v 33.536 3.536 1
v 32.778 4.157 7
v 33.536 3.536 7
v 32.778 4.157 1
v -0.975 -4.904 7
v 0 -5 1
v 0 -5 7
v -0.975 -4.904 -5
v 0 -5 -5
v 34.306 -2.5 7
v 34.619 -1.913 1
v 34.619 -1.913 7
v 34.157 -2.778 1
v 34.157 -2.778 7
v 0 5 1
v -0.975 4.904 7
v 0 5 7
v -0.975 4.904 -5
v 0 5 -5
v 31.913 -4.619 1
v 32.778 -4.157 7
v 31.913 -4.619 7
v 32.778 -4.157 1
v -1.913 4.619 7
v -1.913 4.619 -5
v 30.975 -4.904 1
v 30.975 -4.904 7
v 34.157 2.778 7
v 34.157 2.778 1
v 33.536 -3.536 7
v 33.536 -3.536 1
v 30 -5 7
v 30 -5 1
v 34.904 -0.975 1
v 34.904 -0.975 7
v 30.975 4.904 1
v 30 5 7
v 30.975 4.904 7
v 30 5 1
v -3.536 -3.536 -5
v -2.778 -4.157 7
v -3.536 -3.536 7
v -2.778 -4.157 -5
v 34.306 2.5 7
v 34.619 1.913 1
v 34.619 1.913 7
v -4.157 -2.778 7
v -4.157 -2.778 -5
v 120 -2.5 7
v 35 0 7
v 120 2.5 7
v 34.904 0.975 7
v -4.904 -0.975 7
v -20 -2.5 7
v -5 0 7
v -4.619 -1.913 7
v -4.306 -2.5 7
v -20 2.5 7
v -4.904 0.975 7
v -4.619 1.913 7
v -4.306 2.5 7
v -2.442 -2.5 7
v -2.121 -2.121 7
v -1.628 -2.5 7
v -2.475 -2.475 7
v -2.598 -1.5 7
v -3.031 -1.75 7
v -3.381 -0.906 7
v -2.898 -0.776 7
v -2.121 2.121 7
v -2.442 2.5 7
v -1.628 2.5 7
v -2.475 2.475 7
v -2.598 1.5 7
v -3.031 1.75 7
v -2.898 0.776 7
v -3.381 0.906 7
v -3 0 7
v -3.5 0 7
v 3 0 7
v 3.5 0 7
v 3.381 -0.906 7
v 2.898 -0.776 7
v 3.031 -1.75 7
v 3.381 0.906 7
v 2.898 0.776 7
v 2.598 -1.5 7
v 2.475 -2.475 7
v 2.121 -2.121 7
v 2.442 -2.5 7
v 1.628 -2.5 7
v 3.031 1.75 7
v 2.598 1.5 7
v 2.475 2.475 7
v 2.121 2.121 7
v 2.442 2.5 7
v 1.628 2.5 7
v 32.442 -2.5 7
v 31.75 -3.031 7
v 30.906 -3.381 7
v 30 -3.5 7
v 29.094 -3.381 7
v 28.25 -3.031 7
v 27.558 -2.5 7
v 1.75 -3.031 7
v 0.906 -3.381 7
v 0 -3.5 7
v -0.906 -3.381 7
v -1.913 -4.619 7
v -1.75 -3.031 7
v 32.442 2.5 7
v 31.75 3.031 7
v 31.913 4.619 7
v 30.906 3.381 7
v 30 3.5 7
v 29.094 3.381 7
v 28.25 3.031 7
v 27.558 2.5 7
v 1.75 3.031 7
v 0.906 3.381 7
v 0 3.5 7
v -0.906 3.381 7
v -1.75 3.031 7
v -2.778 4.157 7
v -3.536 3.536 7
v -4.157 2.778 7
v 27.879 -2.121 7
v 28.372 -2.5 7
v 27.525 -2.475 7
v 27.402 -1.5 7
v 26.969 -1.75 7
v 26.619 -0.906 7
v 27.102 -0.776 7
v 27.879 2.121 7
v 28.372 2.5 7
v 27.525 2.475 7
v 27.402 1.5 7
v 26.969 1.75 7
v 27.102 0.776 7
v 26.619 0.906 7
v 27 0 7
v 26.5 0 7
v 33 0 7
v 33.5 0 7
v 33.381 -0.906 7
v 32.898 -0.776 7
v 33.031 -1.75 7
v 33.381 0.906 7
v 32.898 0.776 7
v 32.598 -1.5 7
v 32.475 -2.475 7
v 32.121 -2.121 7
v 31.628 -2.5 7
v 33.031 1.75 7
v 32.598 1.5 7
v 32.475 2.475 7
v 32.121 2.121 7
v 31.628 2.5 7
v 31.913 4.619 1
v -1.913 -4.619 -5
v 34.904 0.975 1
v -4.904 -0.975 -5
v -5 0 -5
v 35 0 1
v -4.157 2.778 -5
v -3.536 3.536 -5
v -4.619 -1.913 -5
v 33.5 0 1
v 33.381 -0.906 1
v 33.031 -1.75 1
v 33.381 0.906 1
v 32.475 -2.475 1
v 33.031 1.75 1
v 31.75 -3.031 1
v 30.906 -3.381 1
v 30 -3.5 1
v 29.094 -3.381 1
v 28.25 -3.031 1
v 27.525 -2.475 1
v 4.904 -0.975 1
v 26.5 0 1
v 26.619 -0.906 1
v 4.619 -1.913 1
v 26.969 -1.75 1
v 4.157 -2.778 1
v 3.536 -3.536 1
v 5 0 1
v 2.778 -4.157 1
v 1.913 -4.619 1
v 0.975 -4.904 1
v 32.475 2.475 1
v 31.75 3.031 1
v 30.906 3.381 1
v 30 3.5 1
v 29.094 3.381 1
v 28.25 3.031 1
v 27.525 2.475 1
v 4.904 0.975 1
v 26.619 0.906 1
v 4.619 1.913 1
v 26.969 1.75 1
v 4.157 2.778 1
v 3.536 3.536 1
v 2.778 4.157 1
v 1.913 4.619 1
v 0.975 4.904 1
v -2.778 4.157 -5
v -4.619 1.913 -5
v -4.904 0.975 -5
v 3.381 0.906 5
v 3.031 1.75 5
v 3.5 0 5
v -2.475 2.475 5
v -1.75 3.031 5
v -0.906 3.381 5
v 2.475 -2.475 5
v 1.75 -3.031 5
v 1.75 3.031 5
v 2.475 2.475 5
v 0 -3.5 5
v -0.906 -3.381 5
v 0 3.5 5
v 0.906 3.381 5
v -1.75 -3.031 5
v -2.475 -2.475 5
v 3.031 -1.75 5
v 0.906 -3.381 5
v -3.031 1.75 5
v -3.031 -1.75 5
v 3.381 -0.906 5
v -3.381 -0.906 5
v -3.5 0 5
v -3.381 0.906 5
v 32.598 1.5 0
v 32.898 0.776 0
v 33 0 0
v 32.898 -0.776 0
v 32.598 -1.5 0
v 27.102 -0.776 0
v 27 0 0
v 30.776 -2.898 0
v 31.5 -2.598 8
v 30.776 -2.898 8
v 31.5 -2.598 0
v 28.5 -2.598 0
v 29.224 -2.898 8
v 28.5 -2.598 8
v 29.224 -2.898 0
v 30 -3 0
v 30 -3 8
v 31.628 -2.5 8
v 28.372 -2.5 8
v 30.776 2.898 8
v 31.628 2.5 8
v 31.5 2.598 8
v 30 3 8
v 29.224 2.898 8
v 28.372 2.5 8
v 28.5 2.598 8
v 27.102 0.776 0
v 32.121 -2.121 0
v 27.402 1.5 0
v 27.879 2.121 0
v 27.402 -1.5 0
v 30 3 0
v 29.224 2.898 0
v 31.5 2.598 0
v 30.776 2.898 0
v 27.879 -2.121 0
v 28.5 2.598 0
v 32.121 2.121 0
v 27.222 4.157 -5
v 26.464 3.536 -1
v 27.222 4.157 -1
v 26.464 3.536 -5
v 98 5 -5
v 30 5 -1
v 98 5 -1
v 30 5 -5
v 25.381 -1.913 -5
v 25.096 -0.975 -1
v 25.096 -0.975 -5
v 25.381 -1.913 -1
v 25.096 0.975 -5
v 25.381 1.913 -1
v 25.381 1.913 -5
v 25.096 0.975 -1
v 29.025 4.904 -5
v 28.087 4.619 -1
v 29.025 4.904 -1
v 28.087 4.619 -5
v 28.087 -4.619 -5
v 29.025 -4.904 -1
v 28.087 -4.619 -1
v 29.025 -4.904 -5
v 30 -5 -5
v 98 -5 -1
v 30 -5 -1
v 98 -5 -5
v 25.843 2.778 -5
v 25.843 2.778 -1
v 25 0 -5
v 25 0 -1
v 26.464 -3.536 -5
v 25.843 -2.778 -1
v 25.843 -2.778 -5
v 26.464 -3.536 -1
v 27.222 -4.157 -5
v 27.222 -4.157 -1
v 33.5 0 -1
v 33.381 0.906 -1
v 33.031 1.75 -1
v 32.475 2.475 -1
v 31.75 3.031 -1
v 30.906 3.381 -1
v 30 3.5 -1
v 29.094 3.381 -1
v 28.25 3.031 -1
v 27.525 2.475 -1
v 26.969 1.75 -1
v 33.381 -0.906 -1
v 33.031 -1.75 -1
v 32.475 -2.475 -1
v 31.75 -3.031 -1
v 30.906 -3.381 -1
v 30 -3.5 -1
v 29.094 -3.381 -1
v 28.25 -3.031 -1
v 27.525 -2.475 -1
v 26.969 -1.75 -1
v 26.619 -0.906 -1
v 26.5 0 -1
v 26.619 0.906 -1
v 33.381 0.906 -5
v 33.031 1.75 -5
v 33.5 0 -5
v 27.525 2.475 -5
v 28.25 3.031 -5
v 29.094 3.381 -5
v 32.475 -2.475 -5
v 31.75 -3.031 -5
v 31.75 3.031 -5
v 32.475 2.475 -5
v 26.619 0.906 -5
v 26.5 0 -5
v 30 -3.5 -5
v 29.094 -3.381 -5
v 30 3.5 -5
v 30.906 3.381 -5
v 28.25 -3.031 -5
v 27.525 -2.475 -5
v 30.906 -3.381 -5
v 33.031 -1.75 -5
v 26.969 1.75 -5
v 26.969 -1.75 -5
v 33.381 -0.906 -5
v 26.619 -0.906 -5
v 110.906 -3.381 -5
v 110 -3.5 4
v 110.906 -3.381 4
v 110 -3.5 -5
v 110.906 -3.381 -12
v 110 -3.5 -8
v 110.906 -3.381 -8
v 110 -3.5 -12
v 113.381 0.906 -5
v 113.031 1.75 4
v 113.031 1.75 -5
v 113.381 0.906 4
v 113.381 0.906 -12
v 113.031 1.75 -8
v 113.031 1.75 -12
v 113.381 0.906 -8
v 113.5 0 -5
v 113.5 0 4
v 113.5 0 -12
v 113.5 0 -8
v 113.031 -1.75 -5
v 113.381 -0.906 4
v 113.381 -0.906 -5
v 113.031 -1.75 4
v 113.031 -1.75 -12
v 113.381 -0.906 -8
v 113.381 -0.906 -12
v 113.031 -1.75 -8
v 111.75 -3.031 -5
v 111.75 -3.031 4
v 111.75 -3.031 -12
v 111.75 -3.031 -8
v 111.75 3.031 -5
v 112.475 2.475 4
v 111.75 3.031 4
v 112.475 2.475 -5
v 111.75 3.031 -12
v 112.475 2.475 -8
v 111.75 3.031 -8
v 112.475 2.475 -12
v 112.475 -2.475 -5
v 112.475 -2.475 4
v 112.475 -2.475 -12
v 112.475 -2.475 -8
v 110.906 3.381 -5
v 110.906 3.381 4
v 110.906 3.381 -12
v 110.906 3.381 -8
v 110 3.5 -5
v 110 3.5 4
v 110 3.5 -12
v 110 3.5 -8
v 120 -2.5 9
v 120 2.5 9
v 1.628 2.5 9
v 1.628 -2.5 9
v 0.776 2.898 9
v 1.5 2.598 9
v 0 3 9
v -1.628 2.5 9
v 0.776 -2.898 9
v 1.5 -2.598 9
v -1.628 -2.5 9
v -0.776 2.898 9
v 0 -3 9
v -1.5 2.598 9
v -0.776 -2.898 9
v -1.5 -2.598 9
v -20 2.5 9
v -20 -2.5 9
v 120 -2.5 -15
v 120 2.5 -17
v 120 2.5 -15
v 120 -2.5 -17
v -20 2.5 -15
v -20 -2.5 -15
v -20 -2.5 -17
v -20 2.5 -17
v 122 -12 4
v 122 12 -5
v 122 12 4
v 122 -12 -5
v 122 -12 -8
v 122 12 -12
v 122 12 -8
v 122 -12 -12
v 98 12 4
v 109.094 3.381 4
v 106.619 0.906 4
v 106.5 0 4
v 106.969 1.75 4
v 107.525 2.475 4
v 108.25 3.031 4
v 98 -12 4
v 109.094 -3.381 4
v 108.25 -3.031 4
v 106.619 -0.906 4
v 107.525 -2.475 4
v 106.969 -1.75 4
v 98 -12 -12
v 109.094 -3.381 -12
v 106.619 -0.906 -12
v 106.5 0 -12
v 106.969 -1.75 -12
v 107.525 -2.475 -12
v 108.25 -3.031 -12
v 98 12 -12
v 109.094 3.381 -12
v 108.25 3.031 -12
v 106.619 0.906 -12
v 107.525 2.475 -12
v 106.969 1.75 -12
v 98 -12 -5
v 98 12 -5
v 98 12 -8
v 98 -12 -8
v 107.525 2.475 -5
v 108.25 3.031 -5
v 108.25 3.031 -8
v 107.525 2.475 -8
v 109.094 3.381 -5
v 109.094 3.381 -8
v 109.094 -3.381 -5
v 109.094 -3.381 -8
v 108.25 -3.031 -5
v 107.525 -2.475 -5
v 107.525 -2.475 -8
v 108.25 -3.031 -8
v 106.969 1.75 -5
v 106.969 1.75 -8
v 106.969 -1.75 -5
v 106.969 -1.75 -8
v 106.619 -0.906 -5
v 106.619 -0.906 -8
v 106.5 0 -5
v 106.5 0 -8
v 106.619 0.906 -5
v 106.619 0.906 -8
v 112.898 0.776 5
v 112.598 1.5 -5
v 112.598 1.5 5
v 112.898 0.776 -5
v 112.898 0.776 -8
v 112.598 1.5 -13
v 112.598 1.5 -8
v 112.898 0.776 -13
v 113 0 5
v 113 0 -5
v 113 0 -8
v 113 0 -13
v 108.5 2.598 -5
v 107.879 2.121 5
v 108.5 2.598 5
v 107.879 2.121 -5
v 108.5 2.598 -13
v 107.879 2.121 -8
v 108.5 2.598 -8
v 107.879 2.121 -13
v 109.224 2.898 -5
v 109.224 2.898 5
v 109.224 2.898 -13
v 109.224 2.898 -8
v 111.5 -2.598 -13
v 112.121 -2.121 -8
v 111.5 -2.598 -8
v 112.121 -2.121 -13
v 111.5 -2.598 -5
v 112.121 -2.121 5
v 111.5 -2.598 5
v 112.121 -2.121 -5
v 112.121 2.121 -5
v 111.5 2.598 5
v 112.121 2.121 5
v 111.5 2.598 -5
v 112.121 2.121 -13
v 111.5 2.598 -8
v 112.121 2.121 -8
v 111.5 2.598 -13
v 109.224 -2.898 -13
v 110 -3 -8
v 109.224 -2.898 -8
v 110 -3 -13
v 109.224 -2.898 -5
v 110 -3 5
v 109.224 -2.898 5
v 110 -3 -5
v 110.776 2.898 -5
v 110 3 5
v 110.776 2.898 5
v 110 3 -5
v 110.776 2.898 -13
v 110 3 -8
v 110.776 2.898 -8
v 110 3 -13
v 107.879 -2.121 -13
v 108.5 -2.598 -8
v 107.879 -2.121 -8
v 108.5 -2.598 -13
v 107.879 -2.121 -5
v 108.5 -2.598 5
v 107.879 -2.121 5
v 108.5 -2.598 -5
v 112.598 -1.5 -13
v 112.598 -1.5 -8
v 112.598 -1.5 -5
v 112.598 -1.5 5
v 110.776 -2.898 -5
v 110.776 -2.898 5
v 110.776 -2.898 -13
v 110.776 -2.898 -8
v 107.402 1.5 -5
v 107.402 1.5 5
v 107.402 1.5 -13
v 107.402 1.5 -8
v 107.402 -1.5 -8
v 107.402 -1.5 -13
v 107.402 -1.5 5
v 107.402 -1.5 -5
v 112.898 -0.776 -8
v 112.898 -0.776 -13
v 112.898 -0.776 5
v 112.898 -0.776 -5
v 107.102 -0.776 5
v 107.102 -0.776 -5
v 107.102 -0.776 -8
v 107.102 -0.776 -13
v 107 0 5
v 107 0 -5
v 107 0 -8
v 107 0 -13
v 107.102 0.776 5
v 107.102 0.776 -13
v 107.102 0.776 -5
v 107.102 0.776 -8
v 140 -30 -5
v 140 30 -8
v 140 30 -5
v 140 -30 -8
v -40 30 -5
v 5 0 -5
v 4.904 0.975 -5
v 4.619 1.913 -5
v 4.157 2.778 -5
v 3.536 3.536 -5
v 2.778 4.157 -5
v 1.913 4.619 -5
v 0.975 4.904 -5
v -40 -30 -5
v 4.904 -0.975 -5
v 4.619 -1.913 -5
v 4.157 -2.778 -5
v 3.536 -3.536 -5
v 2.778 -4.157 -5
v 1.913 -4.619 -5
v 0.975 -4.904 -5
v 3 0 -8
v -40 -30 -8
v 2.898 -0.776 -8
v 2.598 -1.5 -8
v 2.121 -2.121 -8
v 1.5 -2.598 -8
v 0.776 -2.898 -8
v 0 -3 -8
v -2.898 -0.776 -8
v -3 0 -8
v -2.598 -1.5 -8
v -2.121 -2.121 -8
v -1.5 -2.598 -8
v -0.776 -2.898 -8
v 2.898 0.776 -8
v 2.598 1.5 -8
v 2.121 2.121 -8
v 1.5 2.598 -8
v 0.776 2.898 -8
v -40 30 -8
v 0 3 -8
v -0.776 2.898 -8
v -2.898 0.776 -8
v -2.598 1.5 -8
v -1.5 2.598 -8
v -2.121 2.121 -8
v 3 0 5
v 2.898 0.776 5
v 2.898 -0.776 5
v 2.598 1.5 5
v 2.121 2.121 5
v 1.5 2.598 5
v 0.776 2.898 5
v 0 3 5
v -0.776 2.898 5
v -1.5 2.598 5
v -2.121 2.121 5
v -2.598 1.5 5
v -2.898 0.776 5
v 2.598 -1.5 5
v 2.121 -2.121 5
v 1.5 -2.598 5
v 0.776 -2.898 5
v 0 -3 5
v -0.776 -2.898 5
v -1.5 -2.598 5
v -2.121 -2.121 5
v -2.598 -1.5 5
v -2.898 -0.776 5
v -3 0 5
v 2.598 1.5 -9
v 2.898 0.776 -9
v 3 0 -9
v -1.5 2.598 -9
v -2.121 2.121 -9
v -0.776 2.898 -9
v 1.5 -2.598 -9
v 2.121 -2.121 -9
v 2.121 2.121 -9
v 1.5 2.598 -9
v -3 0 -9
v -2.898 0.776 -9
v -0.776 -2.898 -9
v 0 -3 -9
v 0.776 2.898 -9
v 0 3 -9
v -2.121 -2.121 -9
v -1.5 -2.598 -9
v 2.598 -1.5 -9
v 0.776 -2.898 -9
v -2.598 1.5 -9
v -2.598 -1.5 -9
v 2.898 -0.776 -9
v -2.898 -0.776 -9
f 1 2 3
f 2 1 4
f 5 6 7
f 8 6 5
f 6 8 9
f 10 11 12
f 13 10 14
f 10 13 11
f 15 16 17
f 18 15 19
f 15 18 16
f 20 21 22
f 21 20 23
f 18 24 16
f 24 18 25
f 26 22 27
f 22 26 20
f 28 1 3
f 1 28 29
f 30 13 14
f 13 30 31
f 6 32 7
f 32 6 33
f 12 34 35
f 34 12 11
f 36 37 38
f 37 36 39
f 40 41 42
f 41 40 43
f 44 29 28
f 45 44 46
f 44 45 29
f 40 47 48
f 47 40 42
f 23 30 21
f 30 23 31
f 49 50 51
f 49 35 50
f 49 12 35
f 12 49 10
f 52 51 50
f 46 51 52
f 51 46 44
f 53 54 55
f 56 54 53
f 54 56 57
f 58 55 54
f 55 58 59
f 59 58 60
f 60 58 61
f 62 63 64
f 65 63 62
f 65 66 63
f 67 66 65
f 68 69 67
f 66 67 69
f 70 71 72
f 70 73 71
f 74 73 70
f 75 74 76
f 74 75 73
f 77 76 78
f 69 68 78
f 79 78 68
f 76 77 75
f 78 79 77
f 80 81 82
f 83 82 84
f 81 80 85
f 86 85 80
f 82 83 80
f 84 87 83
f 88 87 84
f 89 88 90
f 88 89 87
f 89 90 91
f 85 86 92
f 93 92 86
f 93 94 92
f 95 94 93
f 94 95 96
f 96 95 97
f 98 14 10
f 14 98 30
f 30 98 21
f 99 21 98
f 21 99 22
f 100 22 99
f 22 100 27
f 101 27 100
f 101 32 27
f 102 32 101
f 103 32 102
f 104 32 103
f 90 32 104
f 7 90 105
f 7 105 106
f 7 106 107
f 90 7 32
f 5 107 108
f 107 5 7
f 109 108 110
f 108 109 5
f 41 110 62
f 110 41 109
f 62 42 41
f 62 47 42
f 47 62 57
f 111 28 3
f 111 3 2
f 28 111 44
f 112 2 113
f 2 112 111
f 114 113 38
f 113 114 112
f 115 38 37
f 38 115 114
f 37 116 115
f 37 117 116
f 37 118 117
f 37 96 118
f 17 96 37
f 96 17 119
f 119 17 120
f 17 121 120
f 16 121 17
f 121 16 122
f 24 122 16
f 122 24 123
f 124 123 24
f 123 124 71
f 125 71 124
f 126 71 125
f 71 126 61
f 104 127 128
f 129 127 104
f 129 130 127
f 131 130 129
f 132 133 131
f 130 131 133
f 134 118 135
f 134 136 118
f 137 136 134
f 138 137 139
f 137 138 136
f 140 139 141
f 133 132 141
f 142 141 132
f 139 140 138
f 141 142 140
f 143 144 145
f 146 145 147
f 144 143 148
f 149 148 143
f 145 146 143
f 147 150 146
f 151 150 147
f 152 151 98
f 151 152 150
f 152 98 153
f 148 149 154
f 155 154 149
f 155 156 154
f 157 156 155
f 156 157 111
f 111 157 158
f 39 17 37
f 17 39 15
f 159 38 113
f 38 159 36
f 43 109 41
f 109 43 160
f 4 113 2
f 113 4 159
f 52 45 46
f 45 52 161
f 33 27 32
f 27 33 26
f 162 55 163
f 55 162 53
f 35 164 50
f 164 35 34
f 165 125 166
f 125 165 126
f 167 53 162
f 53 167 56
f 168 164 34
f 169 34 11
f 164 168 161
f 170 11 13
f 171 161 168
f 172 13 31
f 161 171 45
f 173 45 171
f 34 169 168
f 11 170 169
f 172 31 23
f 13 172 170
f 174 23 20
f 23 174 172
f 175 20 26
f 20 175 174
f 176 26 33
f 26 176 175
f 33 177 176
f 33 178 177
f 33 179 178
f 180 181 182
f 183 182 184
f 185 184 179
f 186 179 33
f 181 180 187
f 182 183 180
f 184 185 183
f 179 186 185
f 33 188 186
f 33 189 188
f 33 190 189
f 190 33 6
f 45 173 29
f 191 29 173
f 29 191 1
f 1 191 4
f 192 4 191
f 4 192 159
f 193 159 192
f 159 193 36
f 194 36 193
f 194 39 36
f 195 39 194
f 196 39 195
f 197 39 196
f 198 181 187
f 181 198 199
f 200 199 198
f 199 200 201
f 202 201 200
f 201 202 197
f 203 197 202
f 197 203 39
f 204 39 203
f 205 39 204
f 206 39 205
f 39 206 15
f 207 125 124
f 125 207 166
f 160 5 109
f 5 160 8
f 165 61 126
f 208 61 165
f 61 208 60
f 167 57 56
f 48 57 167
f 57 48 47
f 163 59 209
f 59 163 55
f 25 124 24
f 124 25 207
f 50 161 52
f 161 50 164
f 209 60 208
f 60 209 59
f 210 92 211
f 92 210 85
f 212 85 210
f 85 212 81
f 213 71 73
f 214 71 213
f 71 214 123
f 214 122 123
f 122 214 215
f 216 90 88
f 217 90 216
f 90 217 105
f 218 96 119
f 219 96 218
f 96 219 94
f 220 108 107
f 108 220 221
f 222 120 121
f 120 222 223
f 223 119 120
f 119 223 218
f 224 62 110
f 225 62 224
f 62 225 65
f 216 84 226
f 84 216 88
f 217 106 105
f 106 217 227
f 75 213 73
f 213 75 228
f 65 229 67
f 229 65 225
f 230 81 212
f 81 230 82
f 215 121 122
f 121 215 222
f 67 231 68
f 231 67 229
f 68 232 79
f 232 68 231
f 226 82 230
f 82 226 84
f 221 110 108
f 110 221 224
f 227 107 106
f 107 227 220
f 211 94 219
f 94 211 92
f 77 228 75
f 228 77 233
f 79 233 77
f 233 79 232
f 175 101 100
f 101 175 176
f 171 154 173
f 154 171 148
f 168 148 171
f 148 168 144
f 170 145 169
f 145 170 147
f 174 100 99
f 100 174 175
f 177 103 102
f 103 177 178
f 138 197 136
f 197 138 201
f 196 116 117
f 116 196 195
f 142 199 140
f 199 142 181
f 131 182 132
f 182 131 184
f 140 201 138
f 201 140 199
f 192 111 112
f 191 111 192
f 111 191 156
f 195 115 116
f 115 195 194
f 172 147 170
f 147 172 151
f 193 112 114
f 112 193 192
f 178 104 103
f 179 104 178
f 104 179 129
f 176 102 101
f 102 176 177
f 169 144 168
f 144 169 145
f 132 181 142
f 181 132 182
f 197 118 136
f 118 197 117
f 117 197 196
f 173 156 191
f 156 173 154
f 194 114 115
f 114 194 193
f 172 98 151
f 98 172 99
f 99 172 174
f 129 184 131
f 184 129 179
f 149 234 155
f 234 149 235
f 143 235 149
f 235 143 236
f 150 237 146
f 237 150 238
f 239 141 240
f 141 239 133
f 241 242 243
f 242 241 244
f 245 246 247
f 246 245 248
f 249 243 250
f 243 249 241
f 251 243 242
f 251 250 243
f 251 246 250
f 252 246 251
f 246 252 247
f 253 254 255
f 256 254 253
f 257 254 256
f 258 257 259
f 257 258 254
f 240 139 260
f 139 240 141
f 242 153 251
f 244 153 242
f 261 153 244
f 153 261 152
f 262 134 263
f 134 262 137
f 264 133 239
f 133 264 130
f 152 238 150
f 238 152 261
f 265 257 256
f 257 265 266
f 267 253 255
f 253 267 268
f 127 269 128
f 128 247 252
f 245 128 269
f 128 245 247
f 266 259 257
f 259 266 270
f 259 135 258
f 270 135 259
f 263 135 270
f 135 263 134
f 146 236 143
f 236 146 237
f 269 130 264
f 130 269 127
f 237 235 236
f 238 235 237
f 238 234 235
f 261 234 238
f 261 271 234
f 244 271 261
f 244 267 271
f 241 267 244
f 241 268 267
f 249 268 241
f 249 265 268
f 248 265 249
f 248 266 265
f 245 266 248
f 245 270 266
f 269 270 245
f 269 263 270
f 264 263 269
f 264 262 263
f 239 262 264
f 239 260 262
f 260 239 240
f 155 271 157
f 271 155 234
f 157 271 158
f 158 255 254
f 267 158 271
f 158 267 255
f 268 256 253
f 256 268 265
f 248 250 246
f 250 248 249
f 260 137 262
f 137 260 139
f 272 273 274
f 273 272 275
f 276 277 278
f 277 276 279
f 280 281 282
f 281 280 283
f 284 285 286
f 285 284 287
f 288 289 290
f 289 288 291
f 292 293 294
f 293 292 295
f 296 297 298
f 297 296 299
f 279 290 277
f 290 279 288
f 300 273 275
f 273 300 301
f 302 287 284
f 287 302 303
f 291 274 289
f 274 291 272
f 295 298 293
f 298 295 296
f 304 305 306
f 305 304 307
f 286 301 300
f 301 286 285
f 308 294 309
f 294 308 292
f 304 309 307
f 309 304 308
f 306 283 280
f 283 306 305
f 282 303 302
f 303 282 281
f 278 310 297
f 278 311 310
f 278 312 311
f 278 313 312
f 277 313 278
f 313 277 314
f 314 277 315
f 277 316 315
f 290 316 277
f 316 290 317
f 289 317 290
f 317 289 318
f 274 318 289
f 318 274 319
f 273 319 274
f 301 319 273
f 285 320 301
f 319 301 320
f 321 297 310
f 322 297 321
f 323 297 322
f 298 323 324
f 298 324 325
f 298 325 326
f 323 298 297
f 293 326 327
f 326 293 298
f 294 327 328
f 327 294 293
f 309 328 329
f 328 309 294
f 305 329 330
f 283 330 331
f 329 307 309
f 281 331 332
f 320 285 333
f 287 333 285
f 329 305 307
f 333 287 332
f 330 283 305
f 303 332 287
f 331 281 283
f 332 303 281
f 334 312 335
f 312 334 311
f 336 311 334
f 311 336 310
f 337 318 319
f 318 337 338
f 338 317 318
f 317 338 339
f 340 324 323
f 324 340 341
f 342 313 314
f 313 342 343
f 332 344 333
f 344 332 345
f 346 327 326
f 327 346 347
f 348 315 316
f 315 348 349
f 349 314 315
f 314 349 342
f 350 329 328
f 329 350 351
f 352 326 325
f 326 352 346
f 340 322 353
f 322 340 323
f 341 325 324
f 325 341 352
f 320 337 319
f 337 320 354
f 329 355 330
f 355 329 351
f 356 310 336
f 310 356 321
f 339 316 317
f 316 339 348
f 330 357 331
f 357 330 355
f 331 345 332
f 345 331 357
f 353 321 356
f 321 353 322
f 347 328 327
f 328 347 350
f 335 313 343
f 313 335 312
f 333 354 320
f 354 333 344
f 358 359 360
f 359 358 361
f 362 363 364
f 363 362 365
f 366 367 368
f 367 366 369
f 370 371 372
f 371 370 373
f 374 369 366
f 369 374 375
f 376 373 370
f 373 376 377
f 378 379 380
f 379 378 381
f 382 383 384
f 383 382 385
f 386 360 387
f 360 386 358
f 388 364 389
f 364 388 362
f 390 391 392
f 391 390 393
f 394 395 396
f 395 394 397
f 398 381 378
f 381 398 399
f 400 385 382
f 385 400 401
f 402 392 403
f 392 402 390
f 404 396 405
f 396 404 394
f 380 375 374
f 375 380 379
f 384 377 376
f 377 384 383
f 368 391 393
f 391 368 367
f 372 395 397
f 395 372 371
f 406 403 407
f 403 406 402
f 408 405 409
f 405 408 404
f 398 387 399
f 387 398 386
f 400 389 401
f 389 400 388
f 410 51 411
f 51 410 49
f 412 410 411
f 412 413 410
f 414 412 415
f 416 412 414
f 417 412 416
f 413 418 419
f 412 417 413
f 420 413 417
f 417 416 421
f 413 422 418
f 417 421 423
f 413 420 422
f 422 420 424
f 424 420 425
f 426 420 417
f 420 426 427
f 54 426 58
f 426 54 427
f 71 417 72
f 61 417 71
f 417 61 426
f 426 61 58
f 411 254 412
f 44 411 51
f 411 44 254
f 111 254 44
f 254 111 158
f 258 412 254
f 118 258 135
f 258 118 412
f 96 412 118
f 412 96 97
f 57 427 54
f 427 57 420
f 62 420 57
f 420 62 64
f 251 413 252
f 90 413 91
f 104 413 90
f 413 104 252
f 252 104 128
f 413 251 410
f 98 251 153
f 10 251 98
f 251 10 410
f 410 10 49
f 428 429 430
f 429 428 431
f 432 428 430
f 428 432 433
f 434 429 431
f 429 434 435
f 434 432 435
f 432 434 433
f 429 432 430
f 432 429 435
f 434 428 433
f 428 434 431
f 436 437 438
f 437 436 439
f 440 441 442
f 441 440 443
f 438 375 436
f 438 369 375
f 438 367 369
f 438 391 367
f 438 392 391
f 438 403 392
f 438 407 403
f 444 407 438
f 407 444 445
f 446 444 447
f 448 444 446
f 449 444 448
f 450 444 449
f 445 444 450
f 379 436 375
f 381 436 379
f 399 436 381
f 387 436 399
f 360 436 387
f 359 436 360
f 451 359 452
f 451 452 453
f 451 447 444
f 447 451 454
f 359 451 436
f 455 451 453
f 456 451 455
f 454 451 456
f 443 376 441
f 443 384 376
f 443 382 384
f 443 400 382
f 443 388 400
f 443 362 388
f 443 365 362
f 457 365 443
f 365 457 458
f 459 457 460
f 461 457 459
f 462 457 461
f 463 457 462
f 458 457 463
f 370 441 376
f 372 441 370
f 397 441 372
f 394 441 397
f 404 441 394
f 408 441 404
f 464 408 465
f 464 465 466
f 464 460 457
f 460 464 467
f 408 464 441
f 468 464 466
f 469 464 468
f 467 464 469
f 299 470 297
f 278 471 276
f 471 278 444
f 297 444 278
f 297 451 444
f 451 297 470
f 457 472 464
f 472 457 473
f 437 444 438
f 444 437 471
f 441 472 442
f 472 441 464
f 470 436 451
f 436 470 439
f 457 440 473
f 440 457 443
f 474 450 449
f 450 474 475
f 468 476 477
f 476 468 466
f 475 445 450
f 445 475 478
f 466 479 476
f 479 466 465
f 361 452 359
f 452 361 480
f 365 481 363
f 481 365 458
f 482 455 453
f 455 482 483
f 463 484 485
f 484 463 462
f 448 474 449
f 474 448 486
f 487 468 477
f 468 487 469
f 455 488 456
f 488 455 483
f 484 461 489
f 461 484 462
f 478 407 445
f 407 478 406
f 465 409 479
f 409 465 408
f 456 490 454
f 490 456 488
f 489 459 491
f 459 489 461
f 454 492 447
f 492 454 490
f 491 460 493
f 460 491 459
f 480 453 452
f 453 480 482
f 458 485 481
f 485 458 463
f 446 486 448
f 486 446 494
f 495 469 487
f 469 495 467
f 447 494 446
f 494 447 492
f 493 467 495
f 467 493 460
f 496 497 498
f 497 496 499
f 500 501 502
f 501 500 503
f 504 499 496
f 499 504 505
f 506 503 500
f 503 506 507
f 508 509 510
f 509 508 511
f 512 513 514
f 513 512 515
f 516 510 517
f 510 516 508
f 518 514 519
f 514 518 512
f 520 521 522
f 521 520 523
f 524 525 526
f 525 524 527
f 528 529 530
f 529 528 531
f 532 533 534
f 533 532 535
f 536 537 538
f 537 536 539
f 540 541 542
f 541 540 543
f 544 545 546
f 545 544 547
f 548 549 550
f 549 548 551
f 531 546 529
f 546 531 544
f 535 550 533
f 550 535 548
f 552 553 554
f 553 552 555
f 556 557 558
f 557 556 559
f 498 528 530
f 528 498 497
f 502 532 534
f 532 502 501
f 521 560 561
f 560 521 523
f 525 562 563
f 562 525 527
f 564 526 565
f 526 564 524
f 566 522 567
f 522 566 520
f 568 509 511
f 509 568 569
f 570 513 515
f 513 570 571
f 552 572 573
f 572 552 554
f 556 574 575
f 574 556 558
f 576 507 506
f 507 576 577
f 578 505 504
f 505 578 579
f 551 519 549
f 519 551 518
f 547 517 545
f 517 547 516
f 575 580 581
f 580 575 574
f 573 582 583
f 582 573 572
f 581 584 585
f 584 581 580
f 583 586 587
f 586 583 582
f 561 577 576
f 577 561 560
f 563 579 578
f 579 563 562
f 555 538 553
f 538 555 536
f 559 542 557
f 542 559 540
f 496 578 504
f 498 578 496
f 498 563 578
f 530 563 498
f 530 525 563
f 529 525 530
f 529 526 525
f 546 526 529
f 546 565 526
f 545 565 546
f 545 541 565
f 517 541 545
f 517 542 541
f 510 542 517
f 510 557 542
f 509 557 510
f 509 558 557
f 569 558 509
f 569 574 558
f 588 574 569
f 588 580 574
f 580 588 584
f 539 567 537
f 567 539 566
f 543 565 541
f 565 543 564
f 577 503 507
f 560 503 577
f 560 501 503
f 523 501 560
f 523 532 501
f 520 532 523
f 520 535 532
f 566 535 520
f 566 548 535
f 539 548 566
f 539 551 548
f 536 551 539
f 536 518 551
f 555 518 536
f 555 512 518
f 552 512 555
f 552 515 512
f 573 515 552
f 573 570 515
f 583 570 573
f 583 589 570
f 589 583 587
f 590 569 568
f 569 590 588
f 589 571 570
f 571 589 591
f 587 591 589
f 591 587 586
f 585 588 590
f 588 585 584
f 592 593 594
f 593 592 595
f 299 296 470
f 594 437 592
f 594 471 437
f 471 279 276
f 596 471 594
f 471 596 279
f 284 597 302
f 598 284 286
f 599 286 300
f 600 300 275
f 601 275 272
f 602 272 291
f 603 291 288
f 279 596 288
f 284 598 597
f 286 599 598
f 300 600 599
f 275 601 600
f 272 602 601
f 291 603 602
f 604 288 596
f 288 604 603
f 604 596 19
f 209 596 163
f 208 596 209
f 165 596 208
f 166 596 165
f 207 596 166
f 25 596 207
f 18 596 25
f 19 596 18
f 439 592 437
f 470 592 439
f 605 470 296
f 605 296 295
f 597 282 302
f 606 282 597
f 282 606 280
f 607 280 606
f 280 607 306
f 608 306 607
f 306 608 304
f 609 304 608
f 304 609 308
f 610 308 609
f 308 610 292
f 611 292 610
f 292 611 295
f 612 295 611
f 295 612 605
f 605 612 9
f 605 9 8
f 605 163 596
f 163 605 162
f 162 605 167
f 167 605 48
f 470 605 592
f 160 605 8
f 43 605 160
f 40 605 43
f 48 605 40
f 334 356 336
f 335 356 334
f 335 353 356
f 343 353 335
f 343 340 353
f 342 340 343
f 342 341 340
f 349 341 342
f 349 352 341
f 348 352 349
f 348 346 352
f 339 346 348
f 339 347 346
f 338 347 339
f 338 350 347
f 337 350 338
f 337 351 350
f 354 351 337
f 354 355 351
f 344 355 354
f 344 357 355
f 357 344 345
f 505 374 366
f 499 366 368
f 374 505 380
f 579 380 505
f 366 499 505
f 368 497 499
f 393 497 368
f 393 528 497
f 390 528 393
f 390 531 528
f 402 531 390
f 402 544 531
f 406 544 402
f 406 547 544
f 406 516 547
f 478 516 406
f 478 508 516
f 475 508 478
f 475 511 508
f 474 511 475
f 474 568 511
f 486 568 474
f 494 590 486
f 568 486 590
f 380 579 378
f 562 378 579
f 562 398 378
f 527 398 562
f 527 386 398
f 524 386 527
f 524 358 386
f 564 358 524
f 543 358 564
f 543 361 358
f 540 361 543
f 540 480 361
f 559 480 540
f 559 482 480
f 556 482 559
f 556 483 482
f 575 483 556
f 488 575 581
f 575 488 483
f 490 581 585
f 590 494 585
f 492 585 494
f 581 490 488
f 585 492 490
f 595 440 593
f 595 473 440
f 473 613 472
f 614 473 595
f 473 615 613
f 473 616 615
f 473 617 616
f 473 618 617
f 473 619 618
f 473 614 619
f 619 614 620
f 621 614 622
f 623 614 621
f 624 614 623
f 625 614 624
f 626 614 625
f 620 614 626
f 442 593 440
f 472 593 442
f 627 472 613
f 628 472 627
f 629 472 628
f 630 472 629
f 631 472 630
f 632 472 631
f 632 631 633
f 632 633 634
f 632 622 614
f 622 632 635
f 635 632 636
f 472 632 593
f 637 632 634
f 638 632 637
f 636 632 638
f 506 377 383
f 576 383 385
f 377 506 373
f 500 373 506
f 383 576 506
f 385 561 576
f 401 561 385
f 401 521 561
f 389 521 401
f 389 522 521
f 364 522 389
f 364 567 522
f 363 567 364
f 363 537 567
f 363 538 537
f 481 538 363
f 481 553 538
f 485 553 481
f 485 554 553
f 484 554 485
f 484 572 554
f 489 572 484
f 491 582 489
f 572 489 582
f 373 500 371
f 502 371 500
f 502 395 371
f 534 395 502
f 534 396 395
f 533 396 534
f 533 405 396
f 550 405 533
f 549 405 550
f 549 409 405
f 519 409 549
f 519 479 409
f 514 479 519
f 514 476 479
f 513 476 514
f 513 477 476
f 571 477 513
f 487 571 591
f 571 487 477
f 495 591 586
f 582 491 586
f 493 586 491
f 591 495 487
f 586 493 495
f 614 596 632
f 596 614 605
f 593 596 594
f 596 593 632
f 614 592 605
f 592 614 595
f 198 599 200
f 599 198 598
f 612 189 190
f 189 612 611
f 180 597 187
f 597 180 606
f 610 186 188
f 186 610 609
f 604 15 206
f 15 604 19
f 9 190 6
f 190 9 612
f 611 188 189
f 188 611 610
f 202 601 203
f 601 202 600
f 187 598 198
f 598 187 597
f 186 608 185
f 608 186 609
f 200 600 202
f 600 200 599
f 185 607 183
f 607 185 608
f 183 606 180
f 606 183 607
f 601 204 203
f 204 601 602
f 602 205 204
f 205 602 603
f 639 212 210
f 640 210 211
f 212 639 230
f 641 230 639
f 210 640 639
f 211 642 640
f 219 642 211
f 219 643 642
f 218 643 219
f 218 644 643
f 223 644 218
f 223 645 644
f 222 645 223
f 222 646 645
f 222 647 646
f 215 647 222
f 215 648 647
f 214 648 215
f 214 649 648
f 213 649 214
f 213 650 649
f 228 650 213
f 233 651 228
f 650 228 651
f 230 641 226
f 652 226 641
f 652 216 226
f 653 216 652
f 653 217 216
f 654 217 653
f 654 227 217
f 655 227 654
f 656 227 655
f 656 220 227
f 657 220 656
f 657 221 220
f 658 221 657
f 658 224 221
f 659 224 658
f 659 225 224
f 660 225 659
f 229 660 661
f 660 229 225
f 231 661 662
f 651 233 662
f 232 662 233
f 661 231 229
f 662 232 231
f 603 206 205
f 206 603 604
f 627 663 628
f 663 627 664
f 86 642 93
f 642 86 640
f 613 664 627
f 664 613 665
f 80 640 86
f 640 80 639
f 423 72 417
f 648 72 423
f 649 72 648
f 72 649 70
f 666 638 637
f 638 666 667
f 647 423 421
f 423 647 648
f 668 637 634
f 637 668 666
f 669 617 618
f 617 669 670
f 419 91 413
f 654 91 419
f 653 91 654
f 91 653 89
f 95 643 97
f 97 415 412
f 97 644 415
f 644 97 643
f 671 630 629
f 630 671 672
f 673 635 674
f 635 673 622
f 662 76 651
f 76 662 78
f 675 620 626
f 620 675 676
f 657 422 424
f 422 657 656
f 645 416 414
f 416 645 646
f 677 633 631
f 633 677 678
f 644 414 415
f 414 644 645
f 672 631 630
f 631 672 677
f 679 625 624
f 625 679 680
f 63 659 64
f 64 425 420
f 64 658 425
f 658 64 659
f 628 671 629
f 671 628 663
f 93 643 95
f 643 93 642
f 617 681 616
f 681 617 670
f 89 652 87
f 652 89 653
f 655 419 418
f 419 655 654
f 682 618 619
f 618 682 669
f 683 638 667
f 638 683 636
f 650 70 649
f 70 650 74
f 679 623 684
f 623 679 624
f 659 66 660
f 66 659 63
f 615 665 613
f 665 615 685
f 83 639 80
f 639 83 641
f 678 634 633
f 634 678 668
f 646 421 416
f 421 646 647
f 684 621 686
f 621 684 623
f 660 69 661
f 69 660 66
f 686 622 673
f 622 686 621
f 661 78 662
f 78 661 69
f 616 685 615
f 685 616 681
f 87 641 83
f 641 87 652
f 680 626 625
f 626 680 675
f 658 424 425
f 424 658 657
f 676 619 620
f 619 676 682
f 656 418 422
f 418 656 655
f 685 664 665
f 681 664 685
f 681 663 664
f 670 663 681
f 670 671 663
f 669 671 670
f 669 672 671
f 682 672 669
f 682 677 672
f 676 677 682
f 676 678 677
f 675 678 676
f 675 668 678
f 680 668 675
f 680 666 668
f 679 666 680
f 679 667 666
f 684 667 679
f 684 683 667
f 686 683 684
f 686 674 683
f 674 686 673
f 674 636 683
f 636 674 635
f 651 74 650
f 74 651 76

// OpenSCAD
// Slider-Crank Mechanism — Animated with $t
// Uses $t (0..1) for one full crank revolution
//
// Parameters
crank_r     = 30;       // crank radius (mm)
rod_len     = 80;       // connecting rod length (mm)
thickness   = 6;        // link thickness (mm)
link_w      = 10;       // link width (mm)
pin_r       = 3;        // pin/joint radius (mm)
slider_w    = 24;       // slider block width (mm)
slider_h    = 16;       // slider block height (mm)
rail_len    = 140;      // slider rail length (mm)
base_w      = 180;      // base plate width (mm)
base_d      = 60;       // base plate depth (mm)
base_t      = 3;        // base plate thickness (mm)

// Kinematics
theta = $t * 360;                                       // crank angle (deg)
crank_x = crank_r * cos(theta);
crank_y = crank_r * sin(theta);
// Slider x-position from geometry
slider_x = crank_x + sqrt(rod_len*rod_len - crank_y*crank_y);
// Connecting rod angle
rod_angle = atan2(-crank_y, slider_x - crank_x);

// Colors
crank_color  = [0.85, 0.25, 0.25];   // red
rod_color    = [0.25, 0.55, 0.85];   // blue
slider_color = [0.30, 0.75, 0.35];   // green
pin_color    = [0.90, 0.90, 0.90];   // silver
base_color   = [0.40, 0.40, 0.45];   // dark gray
rail_color   = [0.60, 0.60, 0.60];   // gray

module rounded_link(length, width, thick) {
    // A link with rounded ends
    hull() {
        cylinder(h=thick, r=width/2, center=true, $fn=32);
        translate([length, 0, 0])
            cylinder(h=thick, r=width/2, center=true, $fn=32);
    }
}

module pin(height) {
    color(pin_color)
        cylinder(h=height, r=pin_r, center=true, $fn=24);
}

module joint_bore(thick) {
    cylinder(h=thick+1, r=pin_r+0.5, center=true, $fn=24);
}

// ---- Base plate ----
color(base_color)
    translate([rail_len/2 - 20, 0, -base_t/2 - thickness/2 - 2])
        cube([base_w, base_d, base_t], center=true);

// ---- Ground pivot (fixed bearing) ----
color(pin_color)
    translate([0, 0, 0])
        cylinder(h=thickness+4, r=pin_r+2, center=true, $fn=32);

// ---- Crank ----
rotate([0, 0, theta])
    translate([0, 0, thickness/2 + 1]) {
        color(crank_color)
            difference() {
                rounded_link(crank_r, link_w, thickness);
                // Bore at pivot
                joint_bore(thickness);
                // Bore at crank pin
                translate([crank_r, 0, 0])
                    joint_bore(thickness);
            }
        // Crank pin
        translate([crank_r, 0, 0])
            pin(thickness + 2);
    }

// ---- Connecting rod ----
translate([crank_x, crank_y, -(thickness/2 + 1)])
    rotate([0, 0, rod_angle]) {
        color(rod_color)
            difference() {
                rounded_link(rod_len, link_w, thickness);
                joint_bore(thickness);
                translate([rod_len, 0, 0])
                    joint_bore(thickness);
            }
    }

// ---- Slider rail ----
color(rail_color)
    translate([rail_len/2 - 20, 0, -(thickness/2 + 1)]) {
        // Top rail
        translate([0, 0, slider_h/2 + thickness/2 + 1])
            cube([rail_len, link_w/2, 2], center=true);
        // Bottom rail
        translate([0, 0, -(slider_h/2 + thickness/2 + 1)])
            cube([rail_len, link_w/2, 2], center=true);
    }

// ---- Slider block ----
translate([slider_x, 0, -(thickness/2 + 1)]) {
    color(slider_color)
        difference() {
            cube([slider_w, slider_w, slider_h], center=true);
            // Wrist pin bore
            cylinder(h=slider_h+1, r=pin_r+0.5, center=true, $fn=24);
        }
    // Wrist pin
    pin(slider_h + 2);
}

// ---- Ground pivot pin (on top) ----
translate([0, 0, 0])
    pin(thickness * 3);
